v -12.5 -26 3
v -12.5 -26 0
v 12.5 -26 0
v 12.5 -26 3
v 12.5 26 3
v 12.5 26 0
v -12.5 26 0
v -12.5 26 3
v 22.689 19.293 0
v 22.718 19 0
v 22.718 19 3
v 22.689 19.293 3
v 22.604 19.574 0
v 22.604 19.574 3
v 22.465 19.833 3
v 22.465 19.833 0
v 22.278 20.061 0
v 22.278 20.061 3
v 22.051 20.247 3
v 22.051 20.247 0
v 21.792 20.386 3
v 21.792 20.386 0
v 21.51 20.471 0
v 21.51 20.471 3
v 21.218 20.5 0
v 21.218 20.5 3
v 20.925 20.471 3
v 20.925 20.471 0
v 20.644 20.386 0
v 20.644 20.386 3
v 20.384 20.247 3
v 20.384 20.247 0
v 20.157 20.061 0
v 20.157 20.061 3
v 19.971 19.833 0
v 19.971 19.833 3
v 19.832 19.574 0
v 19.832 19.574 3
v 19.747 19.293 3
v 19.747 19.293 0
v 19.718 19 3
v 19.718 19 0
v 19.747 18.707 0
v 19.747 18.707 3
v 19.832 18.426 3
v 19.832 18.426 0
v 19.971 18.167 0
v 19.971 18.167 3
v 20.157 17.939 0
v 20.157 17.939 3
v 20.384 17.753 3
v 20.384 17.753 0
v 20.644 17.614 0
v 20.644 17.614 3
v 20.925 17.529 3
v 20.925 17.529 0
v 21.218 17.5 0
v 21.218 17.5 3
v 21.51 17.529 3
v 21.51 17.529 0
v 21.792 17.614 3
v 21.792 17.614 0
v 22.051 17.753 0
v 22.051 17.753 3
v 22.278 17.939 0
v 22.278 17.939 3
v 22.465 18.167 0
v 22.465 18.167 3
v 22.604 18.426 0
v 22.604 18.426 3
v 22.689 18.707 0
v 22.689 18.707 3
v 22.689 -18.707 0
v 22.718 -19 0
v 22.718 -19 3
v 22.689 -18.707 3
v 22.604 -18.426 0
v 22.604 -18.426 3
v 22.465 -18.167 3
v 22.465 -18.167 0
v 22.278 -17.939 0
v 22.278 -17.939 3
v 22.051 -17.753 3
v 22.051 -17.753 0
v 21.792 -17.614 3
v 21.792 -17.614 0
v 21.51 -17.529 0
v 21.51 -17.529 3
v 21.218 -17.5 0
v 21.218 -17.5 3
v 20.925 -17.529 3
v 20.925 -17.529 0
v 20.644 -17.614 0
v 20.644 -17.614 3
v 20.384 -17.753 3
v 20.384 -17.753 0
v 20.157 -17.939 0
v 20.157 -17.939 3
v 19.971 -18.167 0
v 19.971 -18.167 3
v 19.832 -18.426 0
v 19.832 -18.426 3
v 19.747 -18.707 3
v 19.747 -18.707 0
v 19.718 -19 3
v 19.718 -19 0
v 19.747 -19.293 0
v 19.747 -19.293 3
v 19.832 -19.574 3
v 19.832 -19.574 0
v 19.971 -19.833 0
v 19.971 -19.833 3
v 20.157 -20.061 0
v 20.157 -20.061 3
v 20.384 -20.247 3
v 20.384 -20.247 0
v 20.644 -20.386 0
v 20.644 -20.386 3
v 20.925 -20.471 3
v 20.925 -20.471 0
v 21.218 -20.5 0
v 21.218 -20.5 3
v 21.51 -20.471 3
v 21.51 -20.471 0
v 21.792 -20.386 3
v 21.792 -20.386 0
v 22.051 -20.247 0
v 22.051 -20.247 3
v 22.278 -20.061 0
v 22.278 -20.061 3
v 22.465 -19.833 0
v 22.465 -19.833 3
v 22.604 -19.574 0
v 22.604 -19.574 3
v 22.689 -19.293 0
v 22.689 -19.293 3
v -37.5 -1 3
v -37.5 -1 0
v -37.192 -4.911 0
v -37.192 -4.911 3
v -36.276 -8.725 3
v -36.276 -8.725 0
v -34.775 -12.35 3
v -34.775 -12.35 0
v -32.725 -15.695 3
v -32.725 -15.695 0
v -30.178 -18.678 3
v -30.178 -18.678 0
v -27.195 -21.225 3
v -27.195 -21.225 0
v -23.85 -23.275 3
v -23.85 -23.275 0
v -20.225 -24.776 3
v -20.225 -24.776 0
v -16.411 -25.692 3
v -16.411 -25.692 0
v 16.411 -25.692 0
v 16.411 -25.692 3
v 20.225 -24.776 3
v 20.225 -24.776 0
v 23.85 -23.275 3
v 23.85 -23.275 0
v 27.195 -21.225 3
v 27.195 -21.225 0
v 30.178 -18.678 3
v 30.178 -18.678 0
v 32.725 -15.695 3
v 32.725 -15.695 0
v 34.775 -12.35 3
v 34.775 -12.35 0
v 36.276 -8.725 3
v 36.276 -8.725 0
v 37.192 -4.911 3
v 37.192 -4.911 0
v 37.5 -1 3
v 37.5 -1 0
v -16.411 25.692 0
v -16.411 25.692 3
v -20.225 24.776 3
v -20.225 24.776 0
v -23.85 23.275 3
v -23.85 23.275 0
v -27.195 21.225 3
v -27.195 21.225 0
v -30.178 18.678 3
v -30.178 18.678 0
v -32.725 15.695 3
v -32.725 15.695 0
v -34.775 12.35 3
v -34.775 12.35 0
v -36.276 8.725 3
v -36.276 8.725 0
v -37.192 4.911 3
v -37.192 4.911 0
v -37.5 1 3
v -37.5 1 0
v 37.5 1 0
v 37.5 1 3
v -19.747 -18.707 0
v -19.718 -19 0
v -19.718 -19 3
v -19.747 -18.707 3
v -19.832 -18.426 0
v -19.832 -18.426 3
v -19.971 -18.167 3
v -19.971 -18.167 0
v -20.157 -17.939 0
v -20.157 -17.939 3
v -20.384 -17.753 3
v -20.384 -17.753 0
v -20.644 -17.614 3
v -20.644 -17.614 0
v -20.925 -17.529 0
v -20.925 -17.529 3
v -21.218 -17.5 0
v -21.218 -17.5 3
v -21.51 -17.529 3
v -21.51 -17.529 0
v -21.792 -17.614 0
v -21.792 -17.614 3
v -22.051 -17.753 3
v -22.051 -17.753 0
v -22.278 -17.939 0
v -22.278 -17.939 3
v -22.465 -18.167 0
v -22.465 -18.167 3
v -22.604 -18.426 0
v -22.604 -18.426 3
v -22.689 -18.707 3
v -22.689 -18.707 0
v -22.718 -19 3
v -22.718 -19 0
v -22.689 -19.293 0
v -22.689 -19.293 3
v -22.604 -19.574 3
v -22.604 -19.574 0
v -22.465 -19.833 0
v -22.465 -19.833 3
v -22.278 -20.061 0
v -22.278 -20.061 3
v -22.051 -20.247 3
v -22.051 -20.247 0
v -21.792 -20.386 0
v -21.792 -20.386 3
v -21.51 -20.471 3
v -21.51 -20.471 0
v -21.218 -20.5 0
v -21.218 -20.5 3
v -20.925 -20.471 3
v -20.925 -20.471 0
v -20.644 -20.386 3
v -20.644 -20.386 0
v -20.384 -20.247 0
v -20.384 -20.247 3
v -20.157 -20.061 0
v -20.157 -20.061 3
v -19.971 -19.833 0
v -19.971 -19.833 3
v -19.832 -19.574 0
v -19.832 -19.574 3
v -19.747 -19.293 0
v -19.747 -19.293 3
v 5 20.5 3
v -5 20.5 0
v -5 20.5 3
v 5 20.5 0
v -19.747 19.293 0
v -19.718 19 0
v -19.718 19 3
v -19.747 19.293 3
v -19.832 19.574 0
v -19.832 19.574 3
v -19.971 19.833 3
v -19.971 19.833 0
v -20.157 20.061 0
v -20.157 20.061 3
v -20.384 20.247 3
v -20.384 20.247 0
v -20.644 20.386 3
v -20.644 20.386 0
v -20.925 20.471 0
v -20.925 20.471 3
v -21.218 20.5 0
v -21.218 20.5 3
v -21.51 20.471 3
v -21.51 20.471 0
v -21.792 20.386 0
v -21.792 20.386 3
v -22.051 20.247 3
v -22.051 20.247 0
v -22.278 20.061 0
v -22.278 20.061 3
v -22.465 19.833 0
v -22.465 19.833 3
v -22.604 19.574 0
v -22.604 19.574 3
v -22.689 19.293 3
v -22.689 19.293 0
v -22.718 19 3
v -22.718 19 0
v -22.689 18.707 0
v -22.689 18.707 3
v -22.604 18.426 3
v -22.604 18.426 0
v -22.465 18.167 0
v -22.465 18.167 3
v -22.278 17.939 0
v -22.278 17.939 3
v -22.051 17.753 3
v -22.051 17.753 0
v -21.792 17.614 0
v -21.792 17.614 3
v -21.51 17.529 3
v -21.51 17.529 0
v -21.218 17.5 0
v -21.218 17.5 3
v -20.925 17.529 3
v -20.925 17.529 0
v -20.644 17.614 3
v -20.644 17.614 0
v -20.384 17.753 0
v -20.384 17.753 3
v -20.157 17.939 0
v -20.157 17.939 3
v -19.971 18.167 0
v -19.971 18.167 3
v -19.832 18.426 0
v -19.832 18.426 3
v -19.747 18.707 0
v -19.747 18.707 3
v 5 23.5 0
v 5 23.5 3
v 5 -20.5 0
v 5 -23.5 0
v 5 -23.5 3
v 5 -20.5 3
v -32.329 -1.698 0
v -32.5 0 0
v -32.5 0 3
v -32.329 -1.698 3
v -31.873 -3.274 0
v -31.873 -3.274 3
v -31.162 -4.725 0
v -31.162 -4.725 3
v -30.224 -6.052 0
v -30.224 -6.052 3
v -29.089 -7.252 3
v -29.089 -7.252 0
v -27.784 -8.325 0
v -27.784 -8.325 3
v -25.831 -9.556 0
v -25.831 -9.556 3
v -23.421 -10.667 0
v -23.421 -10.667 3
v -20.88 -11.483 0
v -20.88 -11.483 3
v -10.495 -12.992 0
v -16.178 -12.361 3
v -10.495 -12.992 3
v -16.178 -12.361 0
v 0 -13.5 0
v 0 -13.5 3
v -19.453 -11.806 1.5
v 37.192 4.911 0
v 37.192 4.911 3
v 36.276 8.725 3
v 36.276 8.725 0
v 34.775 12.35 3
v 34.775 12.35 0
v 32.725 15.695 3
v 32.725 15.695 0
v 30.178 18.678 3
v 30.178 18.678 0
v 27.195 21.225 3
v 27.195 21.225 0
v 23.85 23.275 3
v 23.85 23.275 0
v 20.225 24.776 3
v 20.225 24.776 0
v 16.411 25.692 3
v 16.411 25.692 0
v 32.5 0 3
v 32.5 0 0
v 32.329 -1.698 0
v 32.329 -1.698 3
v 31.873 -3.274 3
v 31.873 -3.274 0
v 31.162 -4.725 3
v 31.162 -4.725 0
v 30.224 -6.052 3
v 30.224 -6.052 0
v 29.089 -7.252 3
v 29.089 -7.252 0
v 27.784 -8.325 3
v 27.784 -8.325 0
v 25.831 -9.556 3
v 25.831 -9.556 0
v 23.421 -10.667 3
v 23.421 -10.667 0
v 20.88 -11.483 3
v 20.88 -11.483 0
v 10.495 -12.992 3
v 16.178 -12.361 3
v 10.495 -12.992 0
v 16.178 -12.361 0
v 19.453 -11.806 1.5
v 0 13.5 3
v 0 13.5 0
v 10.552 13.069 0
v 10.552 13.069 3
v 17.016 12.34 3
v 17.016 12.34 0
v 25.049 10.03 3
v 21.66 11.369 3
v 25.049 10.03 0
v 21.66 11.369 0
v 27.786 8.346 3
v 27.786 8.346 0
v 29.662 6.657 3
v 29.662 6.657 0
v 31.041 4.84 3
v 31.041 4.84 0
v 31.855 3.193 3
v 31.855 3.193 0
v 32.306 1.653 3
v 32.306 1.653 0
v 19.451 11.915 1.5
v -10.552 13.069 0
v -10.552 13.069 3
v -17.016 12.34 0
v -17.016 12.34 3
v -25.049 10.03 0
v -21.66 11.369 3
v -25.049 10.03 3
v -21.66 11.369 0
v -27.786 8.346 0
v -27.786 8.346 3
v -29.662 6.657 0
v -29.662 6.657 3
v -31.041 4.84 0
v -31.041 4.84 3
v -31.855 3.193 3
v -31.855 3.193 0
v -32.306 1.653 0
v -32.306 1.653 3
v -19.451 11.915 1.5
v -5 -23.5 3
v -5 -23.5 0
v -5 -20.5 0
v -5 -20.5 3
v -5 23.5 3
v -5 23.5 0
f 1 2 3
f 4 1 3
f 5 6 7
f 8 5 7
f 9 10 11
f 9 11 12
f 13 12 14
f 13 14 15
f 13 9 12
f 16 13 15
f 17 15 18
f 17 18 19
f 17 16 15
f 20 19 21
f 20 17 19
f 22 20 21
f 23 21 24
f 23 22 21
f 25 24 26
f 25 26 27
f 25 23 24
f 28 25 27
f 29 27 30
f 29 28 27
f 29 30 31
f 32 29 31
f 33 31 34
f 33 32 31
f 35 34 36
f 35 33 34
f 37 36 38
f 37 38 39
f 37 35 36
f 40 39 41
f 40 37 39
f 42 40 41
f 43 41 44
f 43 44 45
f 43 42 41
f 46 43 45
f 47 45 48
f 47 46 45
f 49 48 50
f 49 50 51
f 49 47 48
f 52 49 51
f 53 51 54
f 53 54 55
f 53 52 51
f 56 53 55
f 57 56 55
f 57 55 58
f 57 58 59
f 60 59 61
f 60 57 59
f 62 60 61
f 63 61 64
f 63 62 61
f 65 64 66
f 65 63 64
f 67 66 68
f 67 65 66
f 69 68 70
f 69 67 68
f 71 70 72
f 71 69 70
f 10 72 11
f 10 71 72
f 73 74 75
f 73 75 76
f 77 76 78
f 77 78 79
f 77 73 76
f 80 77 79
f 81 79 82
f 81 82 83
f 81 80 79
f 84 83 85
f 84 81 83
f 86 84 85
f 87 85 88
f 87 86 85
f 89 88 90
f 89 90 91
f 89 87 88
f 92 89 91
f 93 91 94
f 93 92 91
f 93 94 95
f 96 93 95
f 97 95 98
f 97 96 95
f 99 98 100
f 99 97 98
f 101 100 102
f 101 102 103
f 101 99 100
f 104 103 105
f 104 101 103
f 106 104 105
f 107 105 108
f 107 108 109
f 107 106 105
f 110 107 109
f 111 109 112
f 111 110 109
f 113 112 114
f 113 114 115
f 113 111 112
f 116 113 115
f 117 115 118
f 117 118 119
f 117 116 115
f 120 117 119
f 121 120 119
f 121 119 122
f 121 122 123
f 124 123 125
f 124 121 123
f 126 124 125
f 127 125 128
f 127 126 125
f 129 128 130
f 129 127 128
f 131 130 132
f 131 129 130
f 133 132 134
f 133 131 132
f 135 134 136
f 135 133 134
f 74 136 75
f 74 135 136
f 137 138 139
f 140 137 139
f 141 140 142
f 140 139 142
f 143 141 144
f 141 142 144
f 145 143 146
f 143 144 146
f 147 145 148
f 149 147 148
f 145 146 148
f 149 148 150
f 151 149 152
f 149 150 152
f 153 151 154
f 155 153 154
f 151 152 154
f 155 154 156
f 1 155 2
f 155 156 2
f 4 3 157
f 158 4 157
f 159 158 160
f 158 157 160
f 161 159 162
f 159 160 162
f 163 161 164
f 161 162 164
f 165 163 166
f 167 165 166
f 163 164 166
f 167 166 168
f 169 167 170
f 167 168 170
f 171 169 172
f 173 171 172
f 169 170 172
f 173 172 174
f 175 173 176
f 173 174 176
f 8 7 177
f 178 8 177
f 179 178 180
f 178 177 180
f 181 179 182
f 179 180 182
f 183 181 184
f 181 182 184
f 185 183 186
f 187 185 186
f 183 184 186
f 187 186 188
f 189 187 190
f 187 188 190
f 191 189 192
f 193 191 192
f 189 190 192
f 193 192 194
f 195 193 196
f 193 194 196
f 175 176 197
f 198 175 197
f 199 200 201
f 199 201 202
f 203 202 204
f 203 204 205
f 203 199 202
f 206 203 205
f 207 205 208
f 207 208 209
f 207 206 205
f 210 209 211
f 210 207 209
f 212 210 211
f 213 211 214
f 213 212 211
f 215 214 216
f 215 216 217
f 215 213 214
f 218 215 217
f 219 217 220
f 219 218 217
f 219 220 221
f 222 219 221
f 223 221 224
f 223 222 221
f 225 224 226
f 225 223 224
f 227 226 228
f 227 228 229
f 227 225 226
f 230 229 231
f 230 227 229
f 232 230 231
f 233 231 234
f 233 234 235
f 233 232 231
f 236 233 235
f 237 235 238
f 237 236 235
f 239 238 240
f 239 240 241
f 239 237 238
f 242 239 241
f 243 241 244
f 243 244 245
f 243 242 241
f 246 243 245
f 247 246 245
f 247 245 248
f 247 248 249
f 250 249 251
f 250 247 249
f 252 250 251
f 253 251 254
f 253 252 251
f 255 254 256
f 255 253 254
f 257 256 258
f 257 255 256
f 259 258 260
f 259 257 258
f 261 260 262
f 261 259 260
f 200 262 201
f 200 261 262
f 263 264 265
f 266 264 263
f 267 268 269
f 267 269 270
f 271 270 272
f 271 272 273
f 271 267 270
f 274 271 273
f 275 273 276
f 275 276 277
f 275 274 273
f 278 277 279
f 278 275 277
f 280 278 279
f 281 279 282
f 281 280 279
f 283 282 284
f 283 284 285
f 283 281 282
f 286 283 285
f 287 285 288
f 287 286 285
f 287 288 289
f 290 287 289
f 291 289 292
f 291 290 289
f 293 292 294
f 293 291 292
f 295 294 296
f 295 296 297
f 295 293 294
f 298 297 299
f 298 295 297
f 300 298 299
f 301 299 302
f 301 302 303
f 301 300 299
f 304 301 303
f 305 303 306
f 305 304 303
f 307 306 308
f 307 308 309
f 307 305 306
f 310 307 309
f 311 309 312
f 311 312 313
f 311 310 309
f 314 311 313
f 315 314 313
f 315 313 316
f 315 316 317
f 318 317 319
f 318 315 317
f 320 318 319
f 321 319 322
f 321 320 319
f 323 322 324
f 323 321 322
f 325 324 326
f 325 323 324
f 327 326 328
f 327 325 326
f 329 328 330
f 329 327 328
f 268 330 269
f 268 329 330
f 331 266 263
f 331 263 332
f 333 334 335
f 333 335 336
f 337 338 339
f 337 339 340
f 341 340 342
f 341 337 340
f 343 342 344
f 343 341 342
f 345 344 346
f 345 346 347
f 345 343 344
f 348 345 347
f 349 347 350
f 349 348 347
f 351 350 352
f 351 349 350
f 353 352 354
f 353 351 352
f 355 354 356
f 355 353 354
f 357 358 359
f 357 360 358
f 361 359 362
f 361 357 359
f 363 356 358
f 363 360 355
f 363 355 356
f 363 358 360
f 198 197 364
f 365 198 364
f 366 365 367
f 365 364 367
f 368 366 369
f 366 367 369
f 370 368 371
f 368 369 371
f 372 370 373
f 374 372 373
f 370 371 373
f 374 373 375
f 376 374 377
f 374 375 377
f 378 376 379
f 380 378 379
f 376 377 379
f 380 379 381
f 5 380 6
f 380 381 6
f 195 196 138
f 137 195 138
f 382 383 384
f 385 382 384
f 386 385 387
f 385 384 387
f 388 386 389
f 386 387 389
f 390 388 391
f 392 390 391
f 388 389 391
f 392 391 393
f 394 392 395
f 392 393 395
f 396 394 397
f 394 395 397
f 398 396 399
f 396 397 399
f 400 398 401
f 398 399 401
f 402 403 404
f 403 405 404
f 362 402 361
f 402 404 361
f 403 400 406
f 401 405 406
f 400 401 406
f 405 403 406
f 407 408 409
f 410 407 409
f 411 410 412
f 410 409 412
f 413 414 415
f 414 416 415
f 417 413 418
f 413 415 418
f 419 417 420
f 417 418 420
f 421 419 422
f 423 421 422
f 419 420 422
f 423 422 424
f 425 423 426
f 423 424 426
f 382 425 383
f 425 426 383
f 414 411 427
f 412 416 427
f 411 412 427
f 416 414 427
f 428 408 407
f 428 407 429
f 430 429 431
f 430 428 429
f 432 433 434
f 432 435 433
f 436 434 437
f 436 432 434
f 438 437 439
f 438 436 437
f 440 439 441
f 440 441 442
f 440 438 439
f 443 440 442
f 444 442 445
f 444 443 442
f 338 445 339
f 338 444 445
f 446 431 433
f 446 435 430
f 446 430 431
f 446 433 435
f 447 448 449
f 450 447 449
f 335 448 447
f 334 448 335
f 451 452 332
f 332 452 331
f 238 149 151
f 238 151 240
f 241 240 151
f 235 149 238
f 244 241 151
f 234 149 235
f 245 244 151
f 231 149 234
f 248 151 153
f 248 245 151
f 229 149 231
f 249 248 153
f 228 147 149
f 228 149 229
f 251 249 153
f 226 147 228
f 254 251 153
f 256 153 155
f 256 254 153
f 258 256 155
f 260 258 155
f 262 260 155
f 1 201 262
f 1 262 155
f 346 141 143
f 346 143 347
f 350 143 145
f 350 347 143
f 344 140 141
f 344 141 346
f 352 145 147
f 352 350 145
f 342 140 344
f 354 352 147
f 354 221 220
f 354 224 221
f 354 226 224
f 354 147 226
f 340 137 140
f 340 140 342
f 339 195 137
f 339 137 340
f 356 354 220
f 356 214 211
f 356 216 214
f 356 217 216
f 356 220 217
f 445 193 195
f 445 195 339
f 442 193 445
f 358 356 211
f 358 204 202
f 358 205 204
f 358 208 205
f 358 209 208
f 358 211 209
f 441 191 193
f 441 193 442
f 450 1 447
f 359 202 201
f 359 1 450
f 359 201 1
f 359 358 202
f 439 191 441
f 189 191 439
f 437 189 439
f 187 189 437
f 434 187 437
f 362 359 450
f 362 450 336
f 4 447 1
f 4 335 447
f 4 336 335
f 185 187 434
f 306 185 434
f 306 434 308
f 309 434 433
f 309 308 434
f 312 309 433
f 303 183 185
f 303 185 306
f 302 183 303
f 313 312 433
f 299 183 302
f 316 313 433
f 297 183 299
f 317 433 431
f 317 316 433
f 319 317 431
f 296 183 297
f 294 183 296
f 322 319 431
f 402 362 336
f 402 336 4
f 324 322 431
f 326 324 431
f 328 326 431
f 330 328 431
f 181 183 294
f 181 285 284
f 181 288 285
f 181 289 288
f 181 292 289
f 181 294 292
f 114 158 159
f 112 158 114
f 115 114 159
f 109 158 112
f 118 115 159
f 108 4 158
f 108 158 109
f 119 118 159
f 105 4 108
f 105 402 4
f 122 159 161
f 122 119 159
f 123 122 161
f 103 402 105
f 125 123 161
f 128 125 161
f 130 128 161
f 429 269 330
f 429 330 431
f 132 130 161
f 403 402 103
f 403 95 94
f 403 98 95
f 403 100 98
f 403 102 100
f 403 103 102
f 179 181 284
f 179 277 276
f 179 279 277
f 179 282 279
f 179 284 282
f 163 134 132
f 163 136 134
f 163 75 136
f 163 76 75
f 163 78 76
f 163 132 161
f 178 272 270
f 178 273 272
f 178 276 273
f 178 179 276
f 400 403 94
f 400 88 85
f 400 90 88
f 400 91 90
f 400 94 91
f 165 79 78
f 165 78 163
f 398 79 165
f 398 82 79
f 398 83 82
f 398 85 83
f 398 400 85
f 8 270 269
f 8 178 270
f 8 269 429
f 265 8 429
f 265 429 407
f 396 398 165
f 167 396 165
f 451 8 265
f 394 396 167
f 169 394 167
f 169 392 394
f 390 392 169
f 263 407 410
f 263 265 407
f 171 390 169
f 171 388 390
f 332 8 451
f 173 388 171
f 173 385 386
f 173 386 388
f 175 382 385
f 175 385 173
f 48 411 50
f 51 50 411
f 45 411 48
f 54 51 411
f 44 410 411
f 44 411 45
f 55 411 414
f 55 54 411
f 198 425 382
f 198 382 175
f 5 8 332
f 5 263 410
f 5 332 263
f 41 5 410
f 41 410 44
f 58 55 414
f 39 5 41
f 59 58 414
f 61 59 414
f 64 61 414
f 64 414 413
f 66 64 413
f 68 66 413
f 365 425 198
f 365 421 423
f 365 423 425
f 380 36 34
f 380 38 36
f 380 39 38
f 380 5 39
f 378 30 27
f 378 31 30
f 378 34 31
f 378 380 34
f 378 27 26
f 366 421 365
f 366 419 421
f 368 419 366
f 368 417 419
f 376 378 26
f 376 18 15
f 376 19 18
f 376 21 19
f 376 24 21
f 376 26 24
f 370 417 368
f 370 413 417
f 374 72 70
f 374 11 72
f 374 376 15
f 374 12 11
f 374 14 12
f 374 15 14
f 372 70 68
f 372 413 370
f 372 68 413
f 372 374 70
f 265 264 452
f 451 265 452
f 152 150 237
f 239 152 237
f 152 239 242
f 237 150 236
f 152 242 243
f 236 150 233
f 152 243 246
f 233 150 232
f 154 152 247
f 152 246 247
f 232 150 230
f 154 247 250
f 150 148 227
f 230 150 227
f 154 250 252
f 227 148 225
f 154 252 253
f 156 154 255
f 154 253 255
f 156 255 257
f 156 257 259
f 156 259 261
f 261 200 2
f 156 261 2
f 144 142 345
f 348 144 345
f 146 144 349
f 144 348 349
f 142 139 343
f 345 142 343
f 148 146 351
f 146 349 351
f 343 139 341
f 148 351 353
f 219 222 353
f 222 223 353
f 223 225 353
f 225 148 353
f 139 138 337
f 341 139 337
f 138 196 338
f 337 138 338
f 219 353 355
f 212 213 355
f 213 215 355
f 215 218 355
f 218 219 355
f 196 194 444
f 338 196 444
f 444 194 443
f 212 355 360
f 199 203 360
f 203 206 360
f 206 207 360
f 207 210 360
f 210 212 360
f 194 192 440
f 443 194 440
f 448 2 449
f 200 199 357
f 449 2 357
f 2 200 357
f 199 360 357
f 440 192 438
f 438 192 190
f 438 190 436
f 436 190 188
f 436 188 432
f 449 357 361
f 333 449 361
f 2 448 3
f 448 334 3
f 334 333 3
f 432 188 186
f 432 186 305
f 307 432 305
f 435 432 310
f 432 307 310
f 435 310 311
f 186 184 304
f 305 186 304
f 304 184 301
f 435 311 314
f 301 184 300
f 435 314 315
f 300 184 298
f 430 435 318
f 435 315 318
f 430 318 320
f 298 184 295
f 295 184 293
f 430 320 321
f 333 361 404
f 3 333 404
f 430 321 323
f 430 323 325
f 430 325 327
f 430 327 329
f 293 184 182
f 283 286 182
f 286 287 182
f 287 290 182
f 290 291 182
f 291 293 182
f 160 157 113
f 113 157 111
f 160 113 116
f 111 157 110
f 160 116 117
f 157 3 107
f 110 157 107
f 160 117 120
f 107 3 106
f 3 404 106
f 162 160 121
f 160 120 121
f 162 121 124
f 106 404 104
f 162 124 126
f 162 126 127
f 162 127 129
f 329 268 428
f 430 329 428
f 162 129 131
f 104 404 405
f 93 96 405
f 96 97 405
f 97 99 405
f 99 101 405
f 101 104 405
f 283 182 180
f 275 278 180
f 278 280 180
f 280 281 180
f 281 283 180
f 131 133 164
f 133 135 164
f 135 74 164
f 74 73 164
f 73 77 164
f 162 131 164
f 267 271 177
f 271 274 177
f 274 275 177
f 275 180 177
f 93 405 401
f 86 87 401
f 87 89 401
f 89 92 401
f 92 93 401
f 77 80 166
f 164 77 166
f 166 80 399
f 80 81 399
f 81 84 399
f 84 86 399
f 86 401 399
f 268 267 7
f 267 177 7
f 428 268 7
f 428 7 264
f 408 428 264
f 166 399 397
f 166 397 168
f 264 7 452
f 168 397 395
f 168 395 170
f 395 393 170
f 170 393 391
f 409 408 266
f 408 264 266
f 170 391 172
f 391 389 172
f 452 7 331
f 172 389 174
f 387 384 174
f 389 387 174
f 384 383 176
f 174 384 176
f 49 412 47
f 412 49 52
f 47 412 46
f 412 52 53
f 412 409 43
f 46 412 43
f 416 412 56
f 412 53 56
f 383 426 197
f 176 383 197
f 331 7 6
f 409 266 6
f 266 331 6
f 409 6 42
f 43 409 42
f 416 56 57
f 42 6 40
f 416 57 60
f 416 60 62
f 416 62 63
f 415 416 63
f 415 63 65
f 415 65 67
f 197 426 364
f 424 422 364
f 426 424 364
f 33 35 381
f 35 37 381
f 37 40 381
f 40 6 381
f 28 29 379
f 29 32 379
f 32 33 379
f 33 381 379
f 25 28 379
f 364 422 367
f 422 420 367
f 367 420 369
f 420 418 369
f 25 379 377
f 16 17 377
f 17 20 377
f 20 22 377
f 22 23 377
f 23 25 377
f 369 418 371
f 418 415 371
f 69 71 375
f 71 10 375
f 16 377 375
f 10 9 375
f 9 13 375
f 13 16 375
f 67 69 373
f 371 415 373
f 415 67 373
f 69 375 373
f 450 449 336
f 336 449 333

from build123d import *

# Parameters (mm, degrees)
ESBO_O1_R                = 1.5
ESBO_O1_W                = 10
ESBO_O1_H                = 3
RESSALTO_EXTRUS_O1_DEPTH = 3


with BuildPart() as part:
    # Esboço1 → Ressalto-extrusão1 (new body)
    with BuildSketch(Plane.XY):
        with BuildLine():
            Line((12.5, 26), (-12.5, 26))
            ThreePointArc((-12.5, 26), (-30.17766953, 18.67766953), (-37.5, 1))
            Line((-37.5, 1), (-37.5, -1))
            ThreePointArc((-37.5, -1), (-30.17766953, -18.67766953), (-12.5, -26))
            Line((-12.5, -26), (12.5, -26))
            ThreePointArc((12.5, -26), (30.17766953, -18.67766953), (37.5, -1))
            Line((37.5, -1), (37.5, 1))
            ThreePointArc((37.5, 1), (30.17766953, 18.67766953), (12.5, 26))
        make_face()
        with Locations((21.217797887, -19)):
            Circle(ESBO_O1_R, mode=Mode.SUBTRACT)
        with Locations((-21.217797887, -19)):
            Circle(ESBO_O1_R, mode=Mode.SUBTRACT)
        with Locations((21.217797887, 19)):
            Circle(ESBO_O1_R, mode=Mode.SUBTRACT)
        with Locations((-21.217797887, 19)):
            Circle(ESBO_O1_R, mode=Mode.SUBTRACT)
        with Locations((0, -22)):
            Rectangle(ESBO_O1_W, ESBO_O1_H, mode=Mode.SUBTRACT)
        with Locations((0, 22)):
            Rectangle(ESBO_O1_W, ESBO_O1_H, mode=Mode.SUBTRACT)
        with BuildLine():
            add(Edge.make_bspline(
                [(0, 13.5), (-6.514313954, 13.371702924), (-13.061550247, 13.159493855), (-25.841412433, 10.670468151), (-32.278969705, 6.557006437), (-32.5, 0)],
                knots=[0, 0, 0, 0, 0.5, 0.5, 1, 1, 1, 1], degree=3))
            add(Edge.make_bspline(
                [(-32.5, 0), (-32.427257733, -6.547836692), (-25.851452541, -10.56016062), (-13.054919404, -13.052475621), (-6.515644351, -13.308712796), (0, -13.5)],
                knots=[0, 0, 0, 0, 0.5, 0.5, 1, 1, 1, 1], degree=3))
            add(Edge.make_bspline(
                [(32.5, 0), (32.427257733, -6.547836692), (25.851452541, -10.56016062), (13.054919404, -13.052475621), (6.515644351, -13.308712796), (0, -13.5)],
                knots=[0, 0, 0, 0, 0.5, 0.5, 1, 1, 1, 1], degree=3))
            add(Edge.make_bspline(
                [(0, 13.5), (6.514313954, 13.371702924), (13.061550247, 13.159493855), (25.841412433, 10.670468151), (32.278969705, 6.557006437), (32.5, 0)],
                knots=[0, 0, 0, 0, 0.5, 0.5, 1, 1, 1, 1], degree=3))
        make_face(mode=Mode.SUBTRACT)
    extrude(amount=RESSALTO_EXTRUS_O1_DEPTH)


solid = part.part
